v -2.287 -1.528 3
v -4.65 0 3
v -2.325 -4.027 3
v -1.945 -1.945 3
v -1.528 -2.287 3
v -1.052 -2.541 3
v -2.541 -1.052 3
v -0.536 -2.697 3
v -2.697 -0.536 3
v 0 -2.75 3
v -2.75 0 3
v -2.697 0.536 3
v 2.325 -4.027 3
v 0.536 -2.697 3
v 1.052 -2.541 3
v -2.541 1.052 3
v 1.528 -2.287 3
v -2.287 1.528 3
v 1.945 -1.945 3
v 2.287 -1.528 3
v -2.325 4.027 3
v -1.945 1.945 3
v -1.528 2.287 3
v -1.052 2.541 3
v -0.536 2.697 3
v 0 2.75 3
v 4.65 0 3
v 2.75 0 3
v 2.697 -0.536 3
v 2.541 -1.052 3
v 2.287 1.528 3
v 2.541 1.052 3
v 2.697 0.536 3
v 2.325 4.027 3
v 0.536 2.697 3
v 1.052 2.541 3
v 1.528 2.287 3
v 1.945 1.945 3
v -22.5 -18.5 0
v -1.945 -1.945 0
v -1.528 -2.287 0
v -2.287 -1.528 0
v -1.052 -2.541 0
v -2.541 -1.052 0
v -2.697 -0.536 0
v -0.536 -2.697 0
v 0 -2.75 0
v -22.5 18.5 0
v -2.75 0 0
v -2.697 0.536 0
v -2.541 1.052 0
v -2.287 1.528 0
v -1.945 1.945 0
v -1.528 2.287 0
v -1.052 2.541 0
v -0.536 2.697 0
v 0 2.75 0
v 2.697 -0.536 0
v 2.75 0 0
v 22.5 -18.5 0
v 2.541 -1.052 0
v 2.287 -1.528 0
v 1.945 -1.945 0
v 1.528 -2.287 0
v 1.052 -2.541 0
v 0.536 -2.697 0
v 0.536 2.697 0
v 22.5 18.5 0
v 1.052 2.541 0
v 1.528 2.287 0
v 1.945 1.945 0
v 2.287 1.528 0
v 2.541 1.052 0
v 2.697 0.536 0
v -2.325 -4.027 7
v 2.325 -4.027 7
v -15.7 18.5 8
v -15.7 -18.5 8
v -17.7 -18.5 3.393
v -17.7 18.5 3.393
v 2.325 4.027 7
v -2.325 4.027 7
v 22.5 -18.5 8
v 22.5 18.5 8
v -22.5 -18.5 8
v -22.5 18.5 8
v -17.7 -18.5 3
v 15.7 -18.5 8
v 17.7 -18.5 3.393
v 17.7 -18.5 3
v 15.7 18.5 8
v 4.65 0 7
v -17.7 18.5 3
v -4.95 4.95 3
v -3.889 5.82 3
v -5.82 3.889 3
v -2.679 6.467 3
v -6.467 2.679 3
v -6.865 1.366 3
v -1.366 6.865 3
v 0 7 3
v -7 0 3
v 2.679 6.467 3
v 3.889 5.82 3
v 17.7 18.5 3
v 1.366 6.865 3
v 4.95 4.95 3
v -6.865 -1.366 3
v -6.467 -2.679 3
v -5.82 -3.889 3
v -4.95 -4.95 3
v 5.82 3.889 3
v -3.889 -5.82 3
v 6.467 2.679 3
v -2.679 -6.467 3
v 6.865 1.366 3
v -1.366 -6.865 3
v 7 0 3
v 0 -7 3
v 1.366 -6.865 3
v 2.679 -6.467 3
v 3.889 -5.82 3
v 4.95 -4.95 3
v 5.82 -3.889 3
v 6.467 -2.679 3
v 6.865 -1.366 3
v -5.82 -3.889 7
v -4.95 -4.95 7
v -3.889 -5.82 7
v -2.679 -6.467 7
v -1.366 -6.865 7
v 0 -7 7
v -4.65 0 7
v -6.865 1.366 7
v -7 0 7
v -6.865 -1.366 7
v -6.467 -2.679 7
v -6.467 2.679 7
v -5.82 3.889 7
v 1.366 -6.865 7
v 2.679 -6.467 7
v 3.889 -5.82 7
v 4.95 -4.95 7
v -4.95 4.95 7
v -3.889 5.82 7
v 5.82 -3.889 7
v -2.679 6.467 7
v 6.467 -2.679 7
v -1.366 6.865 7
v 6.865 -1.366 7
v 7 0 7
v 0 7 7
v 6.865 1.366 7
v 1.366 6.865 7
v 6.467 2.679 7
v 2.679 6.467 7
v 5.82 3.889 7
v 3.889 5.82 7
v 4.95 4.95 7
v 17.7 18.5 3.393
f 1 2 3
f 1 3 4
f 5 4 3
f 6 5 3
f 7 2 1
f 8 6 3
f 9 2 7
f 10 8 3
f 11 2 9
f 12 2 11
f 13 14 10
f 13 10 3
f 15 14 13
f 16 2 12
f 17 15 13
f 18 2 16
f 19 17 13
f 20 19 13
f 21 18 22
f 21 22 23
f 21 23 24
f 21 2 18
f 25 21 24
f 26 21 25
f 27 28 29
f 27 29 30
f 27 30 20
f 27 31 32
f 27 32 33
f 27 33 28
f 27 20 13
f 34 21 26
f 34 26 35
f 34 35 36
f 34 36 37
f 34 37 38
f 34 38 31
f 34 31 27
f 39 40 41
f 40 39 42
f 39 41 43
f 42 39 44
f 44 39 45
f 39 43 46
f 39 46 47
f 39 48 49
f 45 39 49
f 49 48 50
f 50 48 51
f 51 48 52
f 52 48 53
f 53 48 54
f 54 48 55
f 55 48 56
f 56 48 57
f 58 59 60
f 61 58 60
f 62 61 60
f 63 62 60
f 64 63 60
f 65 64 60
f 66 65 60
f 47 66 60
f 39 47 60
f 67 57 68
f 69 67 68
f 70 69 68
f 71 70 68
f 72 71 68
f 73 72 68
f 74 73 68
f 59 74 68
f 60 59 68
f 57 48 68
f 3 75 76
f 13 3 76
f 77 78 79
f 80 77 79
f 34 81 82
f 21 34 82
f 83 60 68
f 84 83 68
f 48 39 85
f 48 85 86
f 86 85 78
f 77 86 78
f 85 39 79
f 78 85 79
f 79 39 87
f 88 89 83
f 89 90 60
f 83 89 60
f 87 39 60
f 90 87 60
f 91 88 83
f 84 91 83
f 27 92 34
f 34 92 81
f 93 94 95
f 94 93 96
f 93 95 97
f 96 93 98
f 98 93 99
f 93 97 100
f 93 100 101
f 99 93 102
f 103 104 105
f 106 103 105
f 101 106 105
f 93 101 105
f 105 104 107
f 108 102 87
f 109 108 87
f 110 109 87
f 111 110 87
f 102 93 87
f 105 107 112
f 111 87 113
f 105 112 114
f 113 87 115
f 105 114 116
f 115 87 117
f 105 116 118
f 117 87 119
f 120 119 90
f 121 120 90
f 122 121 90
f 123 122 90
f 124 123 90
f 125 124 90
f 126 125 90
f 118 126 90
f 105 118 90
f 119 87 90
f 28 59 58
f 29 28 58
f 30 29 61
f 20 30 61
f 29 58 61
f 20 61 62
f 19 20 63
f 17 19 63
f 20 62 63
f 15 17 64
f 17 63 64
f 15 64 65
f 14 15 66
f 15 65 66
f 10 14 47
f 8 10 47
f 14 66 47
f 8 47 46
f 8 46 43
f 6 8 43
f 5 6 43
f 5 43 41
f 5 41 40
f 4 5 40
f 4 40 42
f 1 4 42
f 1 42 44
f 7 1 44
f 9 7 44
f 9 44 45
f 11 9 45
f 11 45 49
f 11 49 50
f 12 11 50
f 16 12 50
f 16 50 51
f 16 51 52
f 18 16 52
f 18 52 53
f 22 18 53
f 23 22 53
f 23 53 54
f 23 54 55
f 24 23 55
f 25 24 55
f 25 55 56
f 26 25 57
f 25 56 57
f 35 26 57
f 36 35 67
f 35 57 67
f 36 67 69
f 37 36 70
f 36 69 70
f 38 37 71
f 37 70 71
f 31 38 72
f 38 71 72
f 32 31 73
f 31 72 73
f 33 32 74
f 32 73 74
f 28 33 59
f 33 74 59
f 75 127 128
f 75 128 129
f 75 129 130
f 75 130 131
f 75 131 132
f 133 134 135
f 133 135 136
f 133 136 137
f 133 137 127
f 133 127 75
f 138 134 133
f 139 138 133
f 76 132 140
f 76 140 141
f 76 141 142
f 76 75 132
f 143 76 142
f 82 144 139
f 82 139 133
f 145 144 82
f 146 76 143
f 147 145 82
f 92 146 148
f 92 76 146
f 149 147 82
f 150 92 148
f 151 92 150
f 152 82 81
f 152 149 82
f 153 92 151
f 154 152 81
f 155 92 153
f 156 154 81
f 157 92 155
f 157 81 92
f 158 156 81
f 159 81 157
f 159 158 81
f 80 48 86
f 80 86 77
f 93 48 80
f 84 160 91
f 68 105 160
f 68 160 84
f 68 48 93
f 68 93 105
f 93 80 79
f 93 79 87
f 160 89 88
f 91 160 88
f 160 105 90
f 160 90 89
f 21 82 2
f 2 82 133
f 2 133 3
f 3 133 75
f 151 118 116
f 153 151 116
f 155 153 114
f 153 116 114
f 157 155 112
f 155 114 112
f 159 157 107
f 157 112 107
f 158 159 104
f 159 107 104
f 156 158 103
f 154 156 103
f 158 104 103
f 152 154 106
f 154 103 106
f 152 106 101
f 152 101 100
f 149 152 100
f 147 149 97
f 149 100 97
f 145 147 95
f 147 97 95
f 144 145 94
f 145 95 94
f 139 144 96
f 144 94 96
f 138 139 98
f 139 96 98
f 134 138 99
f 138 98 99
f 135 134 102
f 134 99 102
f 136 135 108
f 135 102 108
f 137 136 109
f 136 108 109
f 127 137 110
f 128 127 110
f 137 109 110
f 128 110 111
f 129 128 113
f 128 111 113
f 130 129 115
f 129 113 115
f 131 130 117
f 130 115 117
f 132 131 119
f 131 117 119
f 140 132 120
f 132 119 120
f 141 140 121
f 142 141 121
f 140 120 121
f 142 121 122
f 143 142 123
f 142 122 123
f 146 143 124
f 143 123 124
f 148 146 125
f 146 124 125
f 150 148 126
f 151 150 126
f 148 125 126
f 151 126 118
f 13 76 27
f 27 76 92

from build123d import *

# Parameters (mm, degrees)
F0_W     = 45
F0_H     = 37
F1_DEPTH = 8
F3_DEPTH = 37.001
F5_R     = 7
F6_DEPTH = 4
F4_R     = 2.75
F7_DEPTH = 25
F9_DEPTH = 4


with BuildPart() as f1:
    # F0 (on Top) → F1 (new body)
    with BuildSketch(Plane.XY):
        Rectangle(F0_W, F0_H)
    extrude(amount=F1_DEPTH)

    # F2 (on face) → F3 (cut, through all)
    with BuildSketch(Plane.XZ.offset(18.5)):
        Polygon((15.7, 8), (-15.7, 8), (-17.7, 3.392867), (-17.7, 3), (17.7, 3), (17.7, 3.392867), align=None)
    extrude(amount=-F3_DEPTH, mode=Mode.SUBTRACT)

    # F5 (on face) → F6 (join)
    with BuildSketch(Plane.XY.offset(3)):
        Circle(F5_R)
    extrude(amount=F6_DEPTH)

    # F4 (on face) → F7 (cut)
    with BuildSketch(Plane(origin=(0, 0, 0), x_dir=(1, 0, 0), z_dir=(0, 0, -1))):
        Circle(F4_R)
    extrude(amount=-F7_DEPTH, mode=Mode.SUBTRACT)

    # F8 (on face) → F9 (cut)
    with BuildSketch(Plane.XY.offset(7)):
        Polygon((2.325, -4.027018), (4.65, 0), (2.325, 4.027018), (-2.325, 4.027018), (-4.65, 0), (-2.325, -4.027018), align=None)
    extrude(amount=-F9_DEPTH, mode=Mode.SUBTRACT)


solid = f1.part
